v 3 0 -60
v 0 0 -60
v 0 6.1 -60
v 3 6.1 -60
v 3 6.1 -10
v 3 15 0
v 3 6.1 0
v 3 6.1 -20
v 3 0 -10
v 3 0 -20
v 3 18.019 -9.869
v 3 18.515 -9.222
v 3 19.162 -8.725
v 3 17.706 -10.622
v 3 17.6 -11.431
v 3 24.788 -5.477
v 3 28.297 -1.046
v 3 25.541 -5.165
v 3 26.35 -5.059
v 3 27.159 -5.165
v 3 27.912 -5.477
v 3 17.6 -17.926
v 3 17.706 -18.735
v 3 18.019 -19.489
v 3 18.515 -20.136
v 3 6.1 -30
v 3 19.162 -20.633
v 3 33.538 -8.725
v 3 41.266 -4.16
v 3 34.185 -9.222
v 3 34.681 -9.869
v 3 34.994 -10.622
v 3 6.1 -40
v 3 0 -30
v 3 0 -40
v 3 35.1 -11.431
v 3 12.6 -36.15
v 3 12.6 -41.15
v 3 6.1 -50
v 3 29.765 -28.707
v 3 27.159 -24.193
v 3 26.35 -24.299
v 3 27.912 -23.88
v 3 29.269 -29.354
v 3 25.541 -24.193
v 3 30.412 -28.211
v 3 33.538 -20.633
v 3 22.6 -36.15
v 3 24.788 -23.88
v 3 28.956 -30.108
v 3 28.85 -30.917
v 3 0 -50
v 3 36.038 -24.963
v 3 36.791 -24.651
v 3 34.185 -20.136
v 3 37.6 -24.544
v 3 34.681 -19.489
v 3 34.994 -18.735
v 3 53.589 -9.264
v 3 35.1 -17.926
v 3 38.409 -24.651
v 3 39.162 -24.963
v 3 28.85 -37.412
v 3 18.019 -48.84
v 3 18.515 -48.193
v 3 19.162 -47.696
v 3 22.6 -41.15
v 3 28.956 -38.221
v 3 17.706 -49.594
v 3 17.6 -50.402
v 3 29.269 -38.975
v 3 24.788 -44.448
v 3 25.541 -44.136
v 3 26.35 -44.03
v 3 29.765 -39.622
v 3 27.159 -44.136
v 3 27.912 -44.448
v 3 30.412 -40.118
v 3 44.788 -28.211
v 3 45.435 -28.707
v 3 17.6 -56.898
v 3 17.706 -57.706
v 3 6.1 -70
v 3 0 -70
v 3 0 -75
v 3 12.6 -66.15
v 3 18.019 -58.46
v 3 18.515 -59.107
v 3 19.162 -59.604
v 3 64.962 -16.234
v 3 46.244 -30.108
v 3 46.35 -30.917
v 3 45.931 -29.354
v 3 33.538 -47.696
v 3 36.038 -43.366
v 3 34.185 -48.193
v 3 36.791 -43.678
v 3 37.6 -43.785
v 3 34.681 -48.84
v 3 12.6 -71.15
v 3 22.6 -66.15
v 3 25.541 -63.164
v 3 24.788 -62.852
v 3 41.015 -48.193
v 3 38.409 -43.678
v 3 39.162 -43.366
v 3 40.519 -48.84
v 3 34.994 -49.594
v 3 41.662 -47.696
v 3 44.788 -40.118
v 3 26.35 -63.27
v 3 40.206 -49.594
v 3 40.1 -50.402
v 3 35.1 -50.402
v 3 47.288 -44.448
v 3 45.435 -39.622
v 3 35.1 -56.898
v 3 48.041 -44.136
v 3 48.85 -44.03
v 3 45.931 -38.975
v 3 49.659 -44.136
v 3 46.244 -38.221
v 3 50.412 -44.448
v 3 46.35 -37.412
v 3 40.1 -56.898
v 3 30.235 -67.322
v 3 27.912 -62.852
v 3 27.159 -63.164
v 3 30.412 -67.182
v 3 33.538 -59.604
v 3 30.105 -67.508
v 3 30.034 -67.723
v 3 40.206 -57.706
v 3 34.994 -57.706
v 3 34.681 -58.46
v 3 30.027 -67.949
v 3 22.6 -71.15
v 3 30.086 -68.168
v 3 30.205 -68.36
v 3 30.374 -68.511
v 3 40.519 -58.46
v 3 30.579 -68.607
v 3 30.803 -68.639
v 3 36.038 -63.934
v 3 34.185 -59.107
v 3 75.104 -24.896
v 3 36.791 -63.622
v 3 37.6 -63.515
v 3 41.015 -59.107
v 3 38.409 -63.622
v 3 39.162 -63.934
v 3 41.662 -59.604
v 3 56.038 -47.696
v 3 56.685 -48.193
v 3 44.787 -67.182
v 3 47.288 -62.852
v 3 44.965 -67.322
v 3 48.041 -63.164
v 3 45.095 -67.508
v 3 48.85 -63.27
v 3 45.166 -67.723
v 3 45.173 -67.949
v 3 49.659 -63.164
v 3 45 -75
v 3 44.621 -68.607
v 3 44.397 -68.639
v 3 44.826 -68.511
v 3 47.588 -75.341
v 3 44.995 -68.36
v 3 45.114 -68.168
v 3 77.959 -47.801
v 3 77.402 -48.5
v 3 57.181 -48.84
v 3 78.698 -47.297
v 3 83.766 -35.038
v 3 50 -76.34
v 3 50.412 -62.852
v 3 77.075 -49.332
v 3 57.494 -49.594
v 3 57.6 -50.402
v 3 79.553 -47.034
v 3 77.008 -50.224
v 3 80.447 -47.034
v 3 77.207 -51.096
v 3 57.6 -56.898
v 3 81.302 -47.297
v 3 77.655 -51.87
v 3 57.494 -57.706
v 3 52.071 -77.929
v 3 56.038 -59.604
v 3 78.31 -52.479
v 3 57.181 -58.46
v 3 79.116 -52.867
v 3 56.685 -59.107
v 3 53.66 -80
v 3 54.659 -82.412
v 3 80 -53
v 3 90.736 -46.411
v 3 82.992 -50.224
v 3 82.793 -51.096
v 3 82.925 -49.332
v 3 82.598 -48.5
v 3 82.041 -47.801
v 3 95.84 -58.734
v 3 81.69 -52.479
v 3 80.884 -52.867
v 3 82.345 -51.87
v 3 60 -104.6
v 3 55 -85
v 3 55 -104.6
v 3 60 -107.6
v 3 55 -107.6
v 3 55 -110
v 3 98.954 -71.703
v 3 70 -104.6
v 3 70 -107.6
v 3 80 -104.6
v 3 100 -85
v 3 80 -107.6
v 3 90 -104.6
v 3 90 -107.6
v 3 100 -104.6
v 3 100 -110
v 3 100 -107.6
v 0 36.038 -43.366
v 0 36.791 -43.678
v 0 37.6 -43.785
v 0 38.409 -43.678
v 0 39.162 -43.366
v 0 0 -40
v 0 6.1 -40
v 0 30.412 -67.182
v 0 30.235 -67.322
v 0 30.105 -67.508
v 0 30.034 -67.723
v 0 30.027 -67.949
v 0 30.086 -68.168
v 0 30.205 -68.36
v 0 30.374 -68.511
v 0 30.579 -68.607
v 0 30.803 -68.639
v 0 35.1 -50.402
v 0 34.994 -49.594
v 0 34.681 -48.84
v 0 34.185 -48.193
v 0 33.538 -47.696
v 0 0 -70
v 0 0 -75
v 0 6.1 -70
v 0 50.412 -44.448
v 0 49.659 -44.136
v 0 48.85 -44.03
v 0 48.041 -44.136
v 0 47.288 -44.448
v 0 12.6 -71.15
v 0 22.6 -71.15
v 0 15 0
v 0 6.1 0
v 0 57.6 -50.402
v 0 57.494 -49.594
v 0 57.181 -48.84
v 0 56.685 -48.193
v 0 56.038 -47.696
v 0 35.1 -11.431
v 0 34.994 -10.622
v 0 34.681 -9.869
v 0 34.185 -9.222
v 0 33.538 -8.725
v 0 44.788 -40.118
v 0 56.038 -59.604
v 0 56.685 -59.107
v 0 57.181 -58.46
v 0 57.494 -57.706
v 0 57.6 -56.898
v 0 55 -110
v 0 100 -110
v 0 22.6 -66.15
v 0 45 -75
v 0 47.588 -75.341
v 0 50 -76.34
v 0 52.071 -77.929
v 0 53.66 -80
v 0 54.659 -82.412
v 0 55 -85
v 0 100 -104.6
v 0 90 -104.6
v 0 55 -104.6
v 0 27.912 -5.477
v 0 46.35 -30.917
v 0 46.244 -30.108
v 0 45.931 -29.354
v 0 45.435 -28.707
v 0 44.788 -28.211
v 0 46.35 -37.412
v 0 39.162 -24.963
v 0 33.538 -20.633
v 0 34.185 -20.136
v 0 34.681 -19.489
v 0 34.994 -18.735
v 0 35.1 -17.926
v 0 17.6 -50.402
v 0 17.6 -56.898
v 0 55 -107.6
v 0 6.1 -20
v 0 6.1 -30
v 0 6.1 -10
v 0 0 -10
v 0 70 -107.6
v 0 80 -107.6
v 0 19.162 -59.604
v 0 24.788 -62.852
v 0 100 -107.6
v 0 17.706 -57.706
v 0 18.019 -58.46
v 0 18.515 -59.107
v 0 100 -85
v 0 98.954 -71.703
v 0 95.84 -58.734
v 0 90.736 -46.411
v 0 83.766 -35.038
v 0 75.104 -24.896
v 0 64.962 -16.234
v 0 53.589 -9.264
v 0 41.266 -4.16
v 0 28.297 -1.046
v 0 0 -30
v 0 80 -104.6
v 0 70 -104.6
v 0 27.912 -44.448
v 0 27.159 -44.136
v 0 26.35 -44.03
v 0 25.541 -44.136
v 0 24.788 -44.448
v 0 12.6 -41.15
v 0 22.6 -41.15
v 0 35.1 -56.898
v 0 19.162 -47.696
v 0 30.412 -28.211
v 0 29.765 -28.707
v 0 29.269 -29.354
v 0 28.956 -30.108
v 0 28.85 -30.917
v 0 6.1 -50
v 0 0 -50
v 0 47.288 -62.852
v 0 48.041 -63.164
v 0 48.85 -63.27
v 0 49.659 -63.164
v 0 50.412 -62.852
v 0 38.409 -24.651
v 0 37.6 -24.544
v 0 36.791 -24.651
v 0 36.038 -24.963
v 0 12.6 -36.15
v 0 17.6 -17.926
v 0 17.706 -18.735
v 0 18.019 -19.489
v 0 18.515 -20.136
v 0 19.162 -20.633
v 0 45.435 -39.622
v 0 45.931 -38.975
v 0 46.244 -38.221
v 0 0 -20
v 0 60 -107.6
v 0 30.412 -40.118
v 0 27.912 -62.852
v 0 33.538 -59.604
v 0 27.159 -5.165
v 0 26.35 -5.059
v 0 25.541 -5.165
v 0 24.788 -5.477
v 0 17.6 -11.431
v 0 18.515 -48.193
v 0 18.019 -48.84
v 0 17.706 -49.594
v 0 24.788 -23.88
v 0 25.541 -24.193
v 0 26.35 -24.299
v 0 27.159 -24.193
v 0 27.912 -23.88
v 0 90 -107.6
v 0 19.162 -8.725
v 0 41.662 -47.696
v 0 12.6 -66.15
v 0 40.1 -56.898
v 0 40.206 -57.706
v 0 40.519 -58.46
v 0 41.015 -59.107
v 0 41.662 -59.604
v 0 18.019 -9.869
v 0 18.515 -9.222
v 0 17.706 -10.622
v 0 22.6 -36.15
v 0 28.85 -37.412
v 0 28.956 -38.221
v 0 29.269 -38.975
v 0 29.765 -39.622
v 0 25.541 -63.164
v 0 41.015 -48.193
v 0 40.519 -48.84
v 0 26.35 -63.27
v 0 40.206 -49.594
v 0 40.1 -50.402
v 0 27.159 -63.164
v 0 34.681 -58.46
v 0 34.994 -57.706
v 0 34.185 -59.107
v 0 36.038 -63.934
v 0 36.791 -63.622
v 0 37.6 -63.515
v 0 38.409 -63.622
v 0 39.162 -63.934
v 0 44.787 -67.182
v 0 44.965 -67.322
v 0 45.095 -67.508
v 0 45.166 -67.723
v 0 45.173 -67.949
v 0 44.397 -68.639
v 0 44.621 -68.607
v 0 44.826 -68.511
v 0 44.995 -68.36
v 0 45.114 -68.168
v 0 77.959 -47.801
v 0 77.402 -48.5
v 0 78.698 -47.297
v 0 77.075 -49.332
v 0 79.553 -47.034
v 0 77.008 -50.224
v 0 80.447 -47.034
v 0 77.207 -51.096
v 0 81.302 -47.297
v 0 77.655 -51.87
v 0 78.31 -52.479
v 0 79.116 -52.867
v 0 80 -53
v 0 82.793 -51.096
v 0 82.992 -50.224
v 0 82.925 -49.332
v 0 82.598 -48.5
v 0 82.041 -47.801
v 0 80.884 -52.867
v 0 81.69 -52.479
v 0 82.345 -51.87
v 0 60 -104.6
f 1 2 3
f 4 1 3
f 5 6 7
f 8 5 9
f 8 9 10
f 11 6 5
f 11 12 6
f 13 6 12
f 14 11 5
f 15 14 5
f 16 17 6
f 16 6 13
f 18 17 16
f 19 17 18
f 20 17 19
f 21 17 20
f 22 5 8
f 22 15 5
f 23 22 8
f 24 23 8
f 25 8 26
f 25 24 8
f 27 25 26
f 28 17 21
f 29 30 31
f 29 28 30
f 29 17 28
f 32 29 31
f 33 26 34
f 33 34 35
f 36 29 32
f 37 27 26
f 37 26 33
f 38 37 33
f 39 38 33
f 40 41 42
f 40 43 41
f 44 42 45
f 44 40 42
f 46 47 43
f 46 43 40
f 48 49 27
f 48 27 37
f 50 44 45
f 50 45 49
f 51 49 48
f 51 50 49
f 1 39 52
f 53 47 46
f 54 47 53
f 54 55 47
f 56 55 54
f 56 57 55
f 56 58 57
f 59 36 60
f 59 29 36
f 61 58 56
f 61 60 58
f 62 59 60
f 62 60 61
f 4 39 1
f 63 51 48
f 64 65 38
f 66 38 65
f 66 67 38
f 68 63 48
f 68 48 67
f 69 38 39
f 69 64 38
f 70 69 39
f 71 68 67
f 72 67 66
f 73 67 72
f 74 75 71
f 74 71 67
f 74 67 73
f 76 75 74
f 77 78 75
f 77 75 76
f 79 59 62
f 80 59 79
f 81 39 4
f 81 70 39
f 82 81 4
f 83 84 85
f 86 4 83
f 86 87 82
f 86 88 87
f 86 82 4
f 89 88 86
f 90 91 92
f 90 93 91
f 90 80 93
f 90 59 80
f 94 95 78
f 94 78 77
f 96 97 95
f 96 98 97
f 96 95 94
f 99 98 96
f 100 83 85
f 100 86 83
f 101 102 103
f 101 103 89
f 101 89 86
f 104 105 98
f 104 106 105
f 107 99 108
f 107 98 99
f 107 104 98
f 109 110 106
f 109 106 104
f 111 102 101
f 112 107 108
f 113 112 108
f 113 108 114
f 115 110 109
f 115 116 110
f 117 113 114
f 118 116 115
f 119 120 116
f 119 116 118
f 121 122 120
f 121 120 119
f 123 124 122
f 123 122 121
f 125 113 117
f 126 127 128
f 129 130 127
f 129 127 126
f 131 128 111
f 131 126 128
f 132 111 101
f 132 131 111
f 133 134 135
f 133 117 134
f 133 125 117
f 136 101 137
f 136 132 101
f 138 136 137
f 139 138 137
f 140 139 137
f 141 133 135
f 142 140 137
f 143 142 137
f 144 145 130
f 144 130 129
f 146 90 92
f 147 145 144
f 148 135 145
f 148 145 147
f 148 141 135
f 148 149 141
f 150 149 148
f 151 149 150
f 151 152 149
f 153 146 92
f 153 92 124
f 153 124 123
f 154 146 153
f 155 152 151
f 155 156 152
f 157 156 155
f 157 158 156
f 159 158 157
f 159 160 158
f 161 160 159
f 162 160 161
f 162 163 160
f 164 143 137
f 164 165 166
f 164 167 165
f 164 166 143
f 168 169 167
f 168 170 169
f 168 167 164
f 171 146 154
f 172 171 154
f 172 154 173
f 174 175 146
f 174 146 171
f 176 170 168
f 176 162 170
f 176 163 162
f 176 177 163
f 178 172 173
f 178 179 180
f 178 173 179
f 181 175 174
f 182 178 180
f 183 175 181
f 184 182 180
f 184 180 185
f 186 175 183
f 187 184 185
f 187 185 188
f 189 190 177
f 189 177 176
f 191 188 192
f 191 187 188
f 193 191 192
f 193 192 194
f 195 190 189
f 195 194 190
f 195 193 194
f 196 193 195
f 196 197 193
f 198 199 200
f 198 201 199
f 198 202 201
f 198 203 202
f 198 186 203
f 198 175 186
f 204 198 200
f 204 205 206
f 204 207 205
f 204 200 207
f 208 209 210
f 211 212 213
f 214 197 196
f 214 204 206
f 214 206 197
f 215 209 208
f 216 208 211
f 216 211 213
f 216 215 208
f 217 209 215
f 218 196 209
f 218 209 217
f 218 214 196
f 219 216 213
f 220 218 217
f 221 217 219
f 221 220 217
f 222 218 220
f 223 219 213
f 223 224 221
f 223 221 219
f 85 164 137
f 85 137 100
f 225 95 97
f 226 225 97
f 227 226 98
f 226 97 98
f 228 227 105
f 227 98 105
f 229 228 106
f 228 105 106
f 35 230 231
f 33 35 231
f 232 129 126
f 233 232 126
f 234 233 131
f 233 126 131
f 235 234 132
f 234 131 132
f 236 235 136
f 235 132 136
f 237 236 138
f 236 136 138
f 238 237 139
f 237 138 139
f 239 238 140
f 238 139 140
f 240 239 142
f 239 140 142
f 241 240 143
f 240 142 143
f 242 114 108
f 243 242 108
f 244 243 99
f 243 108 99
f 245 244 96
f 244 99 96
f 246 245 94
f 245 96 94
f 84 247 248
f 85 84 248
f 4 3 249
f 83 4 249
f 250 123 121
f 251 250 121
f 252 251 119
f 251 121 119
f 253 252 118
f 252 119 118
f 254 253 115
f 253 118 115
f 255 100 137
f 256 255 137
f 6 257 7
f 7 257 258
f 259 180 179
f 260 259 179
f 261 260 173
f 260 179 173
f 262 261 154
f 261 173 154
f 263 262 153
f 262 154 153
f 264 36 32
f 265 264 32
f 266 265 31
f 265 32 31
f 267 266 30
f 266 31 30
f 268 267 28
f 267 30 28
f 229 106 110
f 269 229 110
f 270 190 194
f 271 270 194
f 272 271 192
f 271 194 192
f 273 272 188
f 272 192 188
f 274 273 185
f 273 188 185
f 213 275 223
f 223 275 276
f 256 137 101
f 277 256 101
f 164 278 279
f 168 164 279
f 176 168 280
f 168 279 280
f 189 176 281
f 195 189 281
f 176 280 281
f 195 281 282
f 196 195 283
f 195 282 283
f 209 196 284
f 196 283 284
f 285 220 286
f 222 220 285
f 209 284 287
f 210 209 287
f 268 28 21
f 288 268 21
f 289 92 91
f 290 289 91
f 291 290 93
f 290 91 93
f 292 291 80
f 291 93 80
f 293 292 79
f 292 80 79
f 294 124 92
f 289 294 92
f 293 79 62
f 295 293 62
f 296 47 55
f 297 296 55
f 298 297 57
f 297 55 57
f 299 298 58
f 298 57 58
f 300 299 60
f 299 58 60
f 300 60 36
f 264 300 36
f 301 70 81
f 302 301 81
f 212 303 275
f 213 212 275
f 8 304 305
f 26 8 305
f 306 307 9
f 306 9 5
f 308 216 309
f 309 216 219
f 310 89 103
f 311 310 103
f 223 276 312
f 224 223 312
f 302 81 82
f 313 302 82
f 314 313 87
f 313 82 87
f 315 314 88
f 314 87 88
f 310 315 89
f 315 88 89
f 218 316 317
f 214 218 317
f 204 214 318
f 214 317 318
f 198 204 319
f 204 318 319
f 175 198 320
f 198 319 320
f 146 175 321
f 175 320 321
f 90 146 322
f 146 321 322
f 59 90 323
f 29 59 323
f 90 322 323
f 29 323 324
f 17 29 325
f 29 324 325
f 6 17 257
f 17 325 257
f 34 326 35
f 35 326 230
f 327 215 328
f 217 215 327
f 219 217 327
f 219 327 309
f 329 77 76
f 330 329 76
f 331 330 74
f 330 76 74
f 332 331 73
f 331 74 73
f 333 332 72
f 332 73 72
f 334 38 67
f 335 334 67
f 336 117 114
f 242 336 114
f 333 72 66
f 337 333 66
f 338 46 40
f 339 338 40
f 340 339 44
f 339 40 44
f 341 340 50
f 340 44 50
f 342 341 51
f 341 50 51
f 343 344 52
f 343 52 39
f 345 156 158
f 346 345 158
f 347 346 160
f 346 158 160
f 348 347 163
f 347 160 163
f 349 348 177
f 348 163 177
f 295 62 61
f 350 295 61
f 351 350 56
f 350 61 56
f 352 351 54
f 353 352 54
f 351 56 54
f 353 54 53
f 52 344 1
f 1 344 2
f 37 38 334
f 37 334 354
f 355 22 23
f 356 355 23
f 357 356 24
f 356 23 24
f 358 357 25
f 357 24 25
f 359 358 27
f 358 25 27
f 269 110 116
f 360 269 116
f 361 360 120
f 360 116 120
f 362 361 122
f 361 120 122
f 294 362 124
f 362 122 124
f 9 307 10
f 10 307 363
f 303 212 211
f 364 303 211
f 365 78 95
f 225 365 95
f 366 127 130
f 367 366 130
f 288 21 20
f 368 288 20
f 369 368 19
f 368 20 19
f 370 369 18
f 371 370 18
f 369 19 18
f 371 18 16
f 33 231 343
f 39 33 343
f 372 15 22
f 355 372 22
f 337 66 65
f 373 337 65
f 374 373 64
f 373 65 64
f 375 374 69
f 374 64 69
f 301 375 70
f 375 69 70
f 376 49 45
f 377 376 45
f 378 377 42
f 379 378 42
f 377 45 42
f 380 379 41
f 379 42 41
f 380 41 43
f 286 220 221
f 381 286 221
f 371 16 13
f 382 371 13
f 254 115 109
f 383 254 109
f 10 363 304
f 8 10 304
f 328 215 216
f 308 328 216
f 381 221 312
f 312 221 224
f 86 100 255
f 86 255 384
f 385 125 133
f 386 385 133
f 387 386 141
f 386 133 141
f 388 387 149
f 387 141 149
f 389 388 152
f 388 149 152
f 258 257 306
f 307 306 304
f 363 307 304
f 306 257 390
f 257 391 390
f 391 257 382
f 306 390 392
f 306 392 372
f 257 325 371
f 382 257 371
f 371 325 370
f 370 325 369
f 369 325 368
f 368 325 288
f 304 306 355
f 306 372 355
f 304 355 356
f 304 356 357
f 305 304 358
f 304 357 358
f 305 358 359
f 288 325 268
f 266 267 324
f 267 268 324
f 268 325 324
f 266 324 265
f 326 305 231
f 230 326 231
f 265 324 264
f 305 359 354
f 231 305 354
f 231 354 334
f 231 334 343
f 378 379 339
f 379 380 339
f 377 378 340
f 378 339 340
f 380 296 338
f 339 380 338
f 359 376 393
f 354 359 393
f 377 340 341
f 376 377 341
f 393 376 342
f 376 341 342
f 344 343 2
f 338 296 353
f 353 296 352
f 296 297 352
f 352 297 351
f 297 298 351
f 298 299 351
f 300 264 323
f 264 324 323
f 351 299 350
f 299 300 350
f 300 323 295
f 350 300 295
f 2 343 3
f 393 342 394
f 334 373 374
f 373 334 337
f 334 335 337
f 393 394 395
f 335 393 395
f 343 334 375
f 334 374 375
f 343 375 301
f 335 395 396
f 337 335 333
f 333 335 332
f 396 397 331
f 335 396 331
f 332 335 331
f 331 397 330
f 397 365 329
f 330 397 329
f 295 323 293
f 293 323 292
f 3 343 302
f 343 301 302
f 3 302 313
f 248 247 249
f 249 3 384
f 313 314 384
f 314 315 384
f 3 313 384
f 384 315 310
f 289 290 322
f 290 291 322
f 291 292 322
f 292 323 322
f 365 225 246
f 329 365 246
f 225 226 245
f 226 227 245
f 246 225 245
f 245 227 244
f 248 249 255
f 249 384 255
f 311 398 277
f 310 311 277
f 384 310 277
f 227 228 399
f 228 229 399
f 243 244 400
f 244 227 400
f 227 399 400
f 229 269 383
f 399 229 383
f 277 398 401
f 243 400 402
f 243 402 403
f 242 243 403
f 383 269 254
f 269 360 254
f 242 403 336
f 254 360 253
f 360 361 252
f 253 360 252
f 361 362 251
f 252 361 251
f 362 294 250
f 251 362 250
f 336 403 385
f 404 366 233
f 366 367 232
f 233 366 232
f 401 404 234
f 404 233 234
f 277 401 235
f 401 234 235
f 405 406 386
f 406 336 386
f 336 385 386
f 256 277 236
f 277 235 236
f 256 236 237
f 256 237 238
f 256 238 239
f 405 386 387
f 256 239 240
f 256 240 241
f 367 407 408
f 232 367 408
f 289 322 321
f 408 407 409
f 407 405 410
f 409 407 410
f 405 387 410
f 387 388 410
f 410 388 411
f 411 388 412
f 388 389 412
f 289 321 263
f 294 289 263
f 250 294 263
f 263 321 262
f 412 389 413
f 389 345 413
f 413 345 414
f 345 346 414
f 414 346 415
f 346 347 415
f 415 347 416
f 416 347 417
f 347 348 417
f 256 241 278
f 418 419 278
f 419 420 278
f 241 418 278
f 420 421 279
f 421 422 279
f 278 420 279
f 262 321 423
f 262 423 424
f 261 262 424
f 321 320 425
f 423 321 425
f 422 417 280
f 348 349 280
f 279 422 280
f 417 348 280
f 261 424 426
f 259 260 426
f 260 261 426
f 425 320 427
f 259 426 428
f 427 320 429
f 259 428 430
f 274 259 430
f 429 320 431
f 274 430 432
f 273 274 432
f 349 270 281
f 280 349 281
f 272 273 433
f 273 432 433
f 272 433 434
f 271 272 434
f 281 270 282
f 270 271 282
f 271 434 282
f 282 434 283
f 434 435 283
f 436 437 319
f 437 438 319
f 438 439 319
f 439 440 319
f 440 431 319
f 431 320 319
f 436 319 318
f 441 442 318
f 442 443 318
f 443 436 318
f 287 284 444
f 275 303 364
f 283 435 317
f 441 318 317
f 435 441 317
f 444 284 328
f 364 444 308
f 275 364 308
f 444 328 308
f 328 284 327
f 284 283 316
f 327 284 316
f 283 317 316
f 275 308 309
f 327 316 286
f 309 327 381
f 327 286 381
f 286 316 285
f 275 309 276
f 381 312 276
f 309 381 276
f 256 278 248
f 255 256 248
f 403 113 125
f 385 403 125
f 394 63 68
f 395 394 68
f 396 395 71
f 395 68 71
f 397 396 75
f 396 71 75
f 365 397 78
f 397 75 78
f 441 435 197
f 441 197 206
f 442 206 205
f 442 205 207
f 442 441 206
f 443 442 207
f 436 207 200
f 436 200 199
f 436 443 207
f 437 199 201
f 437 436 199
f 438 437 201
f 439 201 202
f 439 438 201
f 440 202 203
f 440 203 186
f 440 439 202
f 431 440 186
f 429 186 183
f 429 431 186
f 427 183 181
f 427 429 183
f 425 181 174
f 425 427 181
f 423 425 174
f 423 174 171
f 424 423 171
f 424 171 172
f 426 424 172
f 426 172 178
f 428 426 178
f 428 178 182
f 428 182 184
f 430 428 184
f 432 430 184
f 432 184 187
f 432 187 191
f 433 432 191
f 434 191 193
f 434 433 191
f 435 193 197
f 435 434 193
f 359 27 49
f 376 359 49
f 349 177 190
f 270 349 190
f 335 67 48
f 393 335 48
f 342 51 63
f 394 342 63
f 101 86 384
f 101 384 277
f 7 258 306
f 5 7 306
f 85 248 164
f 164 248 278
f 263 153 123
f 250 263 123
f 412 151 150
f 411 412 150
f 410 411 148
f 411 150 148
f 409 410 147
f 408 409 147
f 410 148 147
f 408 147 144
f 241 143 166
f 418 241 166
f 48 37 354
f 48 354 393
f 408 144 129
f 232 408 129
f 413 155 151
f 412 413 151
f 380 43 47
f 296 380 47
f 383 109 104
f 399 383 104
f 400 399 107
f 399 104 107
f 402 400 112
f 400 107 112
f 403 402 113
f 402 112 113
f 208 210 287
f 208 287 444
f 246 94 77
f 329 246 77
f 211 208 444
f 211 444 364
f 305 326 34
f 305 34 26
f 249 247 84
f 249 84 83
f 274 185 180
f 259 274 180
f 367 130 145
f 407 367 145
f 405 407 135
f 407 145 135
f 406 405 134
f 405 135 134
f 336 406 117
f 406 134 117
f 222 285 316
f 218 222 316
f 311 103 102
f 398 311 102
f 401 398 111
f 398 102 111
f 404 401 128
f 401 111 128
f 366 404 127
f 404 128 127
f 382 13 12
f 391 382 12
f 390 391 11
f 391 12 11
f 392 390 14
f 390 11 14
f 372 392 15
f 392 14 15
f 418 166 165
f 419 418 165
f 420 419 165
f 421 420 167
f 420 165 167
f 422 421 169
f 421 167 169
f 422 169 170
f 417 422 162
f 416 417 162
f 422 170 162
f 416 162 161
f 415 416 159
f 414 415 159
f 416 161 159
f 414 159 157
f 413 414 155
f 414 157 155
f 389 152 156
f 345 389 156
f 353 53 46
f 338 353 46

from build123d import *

# Parameters (mm, degrees)
SKETCH1_R               = 3
BOSS_EXTRUDE1_DEPTH     = 3
CUT_EXTRUDE1_DEPTH      = 149.690954668
CUT_EXTRUDE1_DEPTH_BACK = 149.690954668
CUT_EXTRUDE2_DEPTH      = 149.690954668
CUT_EXTRUDE2_DEPTH_BACK = 149.690954668
SKETCH4_W               = 10
SKETCH4_H               = 6.1
CUT_EXTRUDE3_DEPTH      = 149.690954668
CUT_EXTRUDE3_DEPTH_BACK = 149.690954668
SKETCH5_W               = 5
SKETCH5_H               = 10
SKETCH6_W               = 3
SKETCH6_H               = 10
SKETCH6_H_2             = 15
CUT_EXTRUDE4_DEPTH      = 149.690954668
CUT_EXTRUDE5_DEPTH      = 149.690954668


with BuildPart() as part:
    # Sketch1 → Boss-Extrude1 (new body)
    with BuildSketch(Plane(origin=(0, 0, 0), x_dir=(0, 0, -1), z_dir=(1, 0, 0))):
        with BuildLine():
            Line((0, 0), (110, 0))
            Line((110, 0), (110, 100))
            Line((110, 100), (85, 100))
            ThreePointArc((85, 100), (24.895923599, 75.104076401), (0, 15))
            Line((0, 15), (0, 0))
        make_face()
        with Locations((50, 80)):
            Circle(SKETCH1_R, mode=Mode.SUBTRACT)
    extrude(amount=BOSS_EXTRUDE1_DEPTH)

    # Sketch2 → Cut-Extrude1 (cut, two sides: drawn at the far end of the back side and taken through both)
    with BuildSketch(Plane(origin=(3, 0, 0), x_dir=(0, 0, -1), z_dir=(1, 0, 0)).offset(-CUT_EXTRUDE1_DEPTH_BACK)):
        with BuildLine():
            Line((110, 0), (75, 0))
            Line((75, 0), (75, 45))
            ThreePointArc((75, 45), (77.928932188, 52.071067812), (85, 55))
            Line((85, 55), (110, 55))
            Line((110, 55), (110, 0))
        make_face()
    extrude(amount=CUT_EXTRUDE1_DEPTH + CUT_EXTRUDE1_DEPTH_BACK, mode=Mode.SUBTRACT)

    # Sketch4 → Cut-Extrude2 (cut, two sides: drawn at the far end of the back side and taken through both)
    with BuildSketch(Plane(origin=(3, 0, 0), x_dir=(0, 0, -1), z_dir=(1, 0, 0)).offset(-CUT_EXTRUDE2_DEPTH_BACK)):
        with Locations((25, 3.05)):
            Rectangle(SKETCH4_W, SKETCH4_H)
        with Locations((5, 3.05)):
            Rectangle(SKETCH4_W, SKETCH4_H)
        with Locations((45, 3.05)):
            Rectangle(SKETCH4_W, SKETCH4_H)
        with Locations((65, 3.05)):
            Rectangle(SKETCH4_W, SKETCH4_H)
    extrude(amount=CUT_EXTRUDE2_DEPTH + CUT_EXTRUDE2_DEPTH_BACK, mode=Mode.SUBTRACT)

    # Sketch5 → Cut-Extrude3 (cut, two sides: drawn at the far end of the back side and taken through both)
    with BuildSketch(Plane.ZY.offset(-CUT_EXTRUDE3_DEPTH_BACK)):
        with Locations((-68.65, 17.6)):
            Rectangle(SKETCH5_W, SKETCH5_H)
        with Locations((-38.65, 17.6)):
            Rectangle(SKETCH5_W, SKETCH5_H)
    extrude(amount=CUT_EXTRUDE3_DEPTH + CUT_EXTRUDE3_DEPTH_BACK, mode=Mode.SUBTRACT)

    # Sketch6 → Cut-Extrude4 (cut, through all)
    with BuildSketch(Plane(origin=(3, 0, 0), x_dir=(0, 0, -1), z_dir=(1, 0, 0))):
        with Locations((106.1, 95)):
            Rectangle(SKETCH6_W, SKETCH6_H)
        with Locations((106.1, 75)):
            Rectangle(SKETCH6_W, SKETCH6_H)
        with Locations((106.1, 52.5)):
            Rectangle(SKETCH6_W, SKETCH6_H_2)
    extrude(amount=-CUT_EXTRUDE4_DEPTH, mode=Mode.SUBTRACT)

    # Sketch7 → Cut-Extrude5 (cut, through all)
    with BuildSketch(Plane(origin=(3, 0, 0), x_dir=(0, 0, -1), z_dir=(1, 0, 0))):
        with BuildLine():
            Line((62.851519915, 50.4125), (59.603924651, 56.0375))
            ThreePointArc((59.603924651, 56.0375), (58.460095264, 57.181329387), (56.897595264, 57.6))
            Line((56.897595264, 57.6), (50.402404736, 57.6))
            ThreePointArc((50.402404736, 57.6), (48.839904736, 57.181329387), (47.696075349, 56.0375))
            Line((47.696075349, 56.0375), (44.448480085, 50.4125))
            ThreePointArc((44.448480085, 50.4125), (44.029809472, 48.85), (44.448480085, 47.2875))
            Line((44.448480085, 47.2875), (47.696075349, 41.6625))
            ThreePointArc((47.696075349, 41.6625), (48.839904736, 40.518670613), (50.402404736, 40.1))
            Line((50.402404736, 40.1), (56.897595264, 40.1))
            ThreePointArc((56.897595264, 40.1), (58.460095264, 40.518670613), (59.603924651, 41.6625))
            Line((59.603924651, 41.6625), (62.851519915, 47.2875))
            ThreePointArc((62.851519915, 47.2875), (63.270190528, 48.85), (62.851519915, 50.4125))
        make_face()
        with BuildLine():
            Line((67.181646934, 44.7875), (63.93405167, 39.1625))
            ThreePointArc((63.93405167, 39.1625), (63.515381057, 37.6), (63.93405167, 36.0375))
            Line((63.93405167, 36.0375), (67.181646934, 30.4125))
            ThreePointArc((67.181646934, 30.4125), (68.06043166, 30.048495448), (68.639479281, 30.803125))
            Line((68.639479281, 30.803125), (68.639479281, 44.396875))
            ThreePointArc((68.639479281, 44.396875), (68.06043166, 45.151504552), (67.181646934, 44.7875))
        make_face()
        with BuildLine():
            Line((62.851519915, 27.9125), (59.603924651, 33.5375))
            ThreePointArc((59.603924651, 33.5375), (58.460095264, 34.681329387), (56.897595264, 35.1))
            Line((56.897595264, 35.1), (50.402404736, 35.1))
            ThreePointArc((50.402404736, 35.1), (48.839904736, 34.681329387), (47.696075349, 33.5375))
            Line((47.696075349, 33.5375), (44.448480085, 27.9125))
            ThreePointArc((44.448480085, 27.9125), (44.029809472, 26.35), (44.448480085, 24.7875))
            Line((44.448480085, 24.7875), (47.696075349, 19.1625))
            ThreePointArc((47.696075349, 19.1625), (48.839904736, 18.018670613), (50.402404736, 17.6))
            Line((50.402404736, 17.6), (56.897595264, 17.6))
            ThreePointArc((56.897595264, 17.6), (58.460095264, 18.018670613), (59.603924651, 19.1625))
            Line((59.603924651, 19.1625), (62.851519915, 24.7875))
            ThreePointArc((62.851519915, 24.7875), (63.270190528, 26.35), (62.851519915, 27.9125))
        make_face()
        with BuildLine():
            Line((43.36594833, 39.1625), (40.118353066, 44.7875))
            ThreePointArc((40.118353066, 44.7875), (38.974523679, 45.931329387), (37.412023679, 46.35))
            Line((37.412023679, 46.35), (30.916833151, 46.35))
            ThreePointArc((30.916833151, 46.35), (29.354333151, 45.931329387), (28.210503764, 44.7875))
            Line((28.210503764, 44.7875), (24.9629085, 39.1625))
            ThreePointArc((24.9629085, 39.1625), (24.544237886, 37.6), (24.9629085, 36.0375))
            Line((24.9629085, 36.0375), (28.210503764, 30.4125))
            ThreePointArc((28.210503764, 30.4125), (29.354333151, 29.268670613), (30.916833151, 28.85))
            Line((30.916833151, 28.85), (37.412023679, 28.85))
            ThreePointArc((37.412023679, 28.85), (38.974523679, 29.268670613), (40.118353066, 30.4125))
            Line((40.118353066, 30.4125), (43.36594833, 36.0375))
            ThreePointArc((43.36594833, 36.0375), (43.784618943, 37.6), (43.36594833, 39.1625))
        make_face()
        with BuildLine():
            Line((23.880376745, 27.9125), (20.632781481, 33.5375))
            ThreePointArc((20.632781481, 33.5375), (19.488952094, 34.681329387), (17.926452094, 35.1))
            Line((17.926452094, 35.1), (11.431261566, 35.1))
            ThreePointArc((11.431261566, 35.1), (9.868761566, 34.681329387), (8.724932179, 33.5375))
            Line((8.724932179, 33.5375), (5.477336915, 27.9125))
            ThreePointArc((5.477336915, 27.9125), (5.058666301, 26.35), (5.477336915, 24.7875))
            Line((5.477336915, 24.7875), (8.724932179, 19.1625))
            ThreePointArc((8.724932179, 19.1625), (9.868761566, 18.018670613), (11.431261566, 17.6))
            Line((11.431261566, 17.6), (17.926452094, 17.6))
            ThreePointArc((17.926452094, 17.6), (19.488952094, 18.018670613), (20.632781481, 19.1625))
            Line((20.632781481, 19.1625), (23.880376745, 24.7875))
            ThreePointArc((23.880376745, 24.7875), (24.299047358, 26.35), (23.880376745, 27.9125))
        make_face()
    extrude(amount=-CUT_EXTRUDE5_DEPTH, mode=Mode.SUBTRACT)


solid = part.part
